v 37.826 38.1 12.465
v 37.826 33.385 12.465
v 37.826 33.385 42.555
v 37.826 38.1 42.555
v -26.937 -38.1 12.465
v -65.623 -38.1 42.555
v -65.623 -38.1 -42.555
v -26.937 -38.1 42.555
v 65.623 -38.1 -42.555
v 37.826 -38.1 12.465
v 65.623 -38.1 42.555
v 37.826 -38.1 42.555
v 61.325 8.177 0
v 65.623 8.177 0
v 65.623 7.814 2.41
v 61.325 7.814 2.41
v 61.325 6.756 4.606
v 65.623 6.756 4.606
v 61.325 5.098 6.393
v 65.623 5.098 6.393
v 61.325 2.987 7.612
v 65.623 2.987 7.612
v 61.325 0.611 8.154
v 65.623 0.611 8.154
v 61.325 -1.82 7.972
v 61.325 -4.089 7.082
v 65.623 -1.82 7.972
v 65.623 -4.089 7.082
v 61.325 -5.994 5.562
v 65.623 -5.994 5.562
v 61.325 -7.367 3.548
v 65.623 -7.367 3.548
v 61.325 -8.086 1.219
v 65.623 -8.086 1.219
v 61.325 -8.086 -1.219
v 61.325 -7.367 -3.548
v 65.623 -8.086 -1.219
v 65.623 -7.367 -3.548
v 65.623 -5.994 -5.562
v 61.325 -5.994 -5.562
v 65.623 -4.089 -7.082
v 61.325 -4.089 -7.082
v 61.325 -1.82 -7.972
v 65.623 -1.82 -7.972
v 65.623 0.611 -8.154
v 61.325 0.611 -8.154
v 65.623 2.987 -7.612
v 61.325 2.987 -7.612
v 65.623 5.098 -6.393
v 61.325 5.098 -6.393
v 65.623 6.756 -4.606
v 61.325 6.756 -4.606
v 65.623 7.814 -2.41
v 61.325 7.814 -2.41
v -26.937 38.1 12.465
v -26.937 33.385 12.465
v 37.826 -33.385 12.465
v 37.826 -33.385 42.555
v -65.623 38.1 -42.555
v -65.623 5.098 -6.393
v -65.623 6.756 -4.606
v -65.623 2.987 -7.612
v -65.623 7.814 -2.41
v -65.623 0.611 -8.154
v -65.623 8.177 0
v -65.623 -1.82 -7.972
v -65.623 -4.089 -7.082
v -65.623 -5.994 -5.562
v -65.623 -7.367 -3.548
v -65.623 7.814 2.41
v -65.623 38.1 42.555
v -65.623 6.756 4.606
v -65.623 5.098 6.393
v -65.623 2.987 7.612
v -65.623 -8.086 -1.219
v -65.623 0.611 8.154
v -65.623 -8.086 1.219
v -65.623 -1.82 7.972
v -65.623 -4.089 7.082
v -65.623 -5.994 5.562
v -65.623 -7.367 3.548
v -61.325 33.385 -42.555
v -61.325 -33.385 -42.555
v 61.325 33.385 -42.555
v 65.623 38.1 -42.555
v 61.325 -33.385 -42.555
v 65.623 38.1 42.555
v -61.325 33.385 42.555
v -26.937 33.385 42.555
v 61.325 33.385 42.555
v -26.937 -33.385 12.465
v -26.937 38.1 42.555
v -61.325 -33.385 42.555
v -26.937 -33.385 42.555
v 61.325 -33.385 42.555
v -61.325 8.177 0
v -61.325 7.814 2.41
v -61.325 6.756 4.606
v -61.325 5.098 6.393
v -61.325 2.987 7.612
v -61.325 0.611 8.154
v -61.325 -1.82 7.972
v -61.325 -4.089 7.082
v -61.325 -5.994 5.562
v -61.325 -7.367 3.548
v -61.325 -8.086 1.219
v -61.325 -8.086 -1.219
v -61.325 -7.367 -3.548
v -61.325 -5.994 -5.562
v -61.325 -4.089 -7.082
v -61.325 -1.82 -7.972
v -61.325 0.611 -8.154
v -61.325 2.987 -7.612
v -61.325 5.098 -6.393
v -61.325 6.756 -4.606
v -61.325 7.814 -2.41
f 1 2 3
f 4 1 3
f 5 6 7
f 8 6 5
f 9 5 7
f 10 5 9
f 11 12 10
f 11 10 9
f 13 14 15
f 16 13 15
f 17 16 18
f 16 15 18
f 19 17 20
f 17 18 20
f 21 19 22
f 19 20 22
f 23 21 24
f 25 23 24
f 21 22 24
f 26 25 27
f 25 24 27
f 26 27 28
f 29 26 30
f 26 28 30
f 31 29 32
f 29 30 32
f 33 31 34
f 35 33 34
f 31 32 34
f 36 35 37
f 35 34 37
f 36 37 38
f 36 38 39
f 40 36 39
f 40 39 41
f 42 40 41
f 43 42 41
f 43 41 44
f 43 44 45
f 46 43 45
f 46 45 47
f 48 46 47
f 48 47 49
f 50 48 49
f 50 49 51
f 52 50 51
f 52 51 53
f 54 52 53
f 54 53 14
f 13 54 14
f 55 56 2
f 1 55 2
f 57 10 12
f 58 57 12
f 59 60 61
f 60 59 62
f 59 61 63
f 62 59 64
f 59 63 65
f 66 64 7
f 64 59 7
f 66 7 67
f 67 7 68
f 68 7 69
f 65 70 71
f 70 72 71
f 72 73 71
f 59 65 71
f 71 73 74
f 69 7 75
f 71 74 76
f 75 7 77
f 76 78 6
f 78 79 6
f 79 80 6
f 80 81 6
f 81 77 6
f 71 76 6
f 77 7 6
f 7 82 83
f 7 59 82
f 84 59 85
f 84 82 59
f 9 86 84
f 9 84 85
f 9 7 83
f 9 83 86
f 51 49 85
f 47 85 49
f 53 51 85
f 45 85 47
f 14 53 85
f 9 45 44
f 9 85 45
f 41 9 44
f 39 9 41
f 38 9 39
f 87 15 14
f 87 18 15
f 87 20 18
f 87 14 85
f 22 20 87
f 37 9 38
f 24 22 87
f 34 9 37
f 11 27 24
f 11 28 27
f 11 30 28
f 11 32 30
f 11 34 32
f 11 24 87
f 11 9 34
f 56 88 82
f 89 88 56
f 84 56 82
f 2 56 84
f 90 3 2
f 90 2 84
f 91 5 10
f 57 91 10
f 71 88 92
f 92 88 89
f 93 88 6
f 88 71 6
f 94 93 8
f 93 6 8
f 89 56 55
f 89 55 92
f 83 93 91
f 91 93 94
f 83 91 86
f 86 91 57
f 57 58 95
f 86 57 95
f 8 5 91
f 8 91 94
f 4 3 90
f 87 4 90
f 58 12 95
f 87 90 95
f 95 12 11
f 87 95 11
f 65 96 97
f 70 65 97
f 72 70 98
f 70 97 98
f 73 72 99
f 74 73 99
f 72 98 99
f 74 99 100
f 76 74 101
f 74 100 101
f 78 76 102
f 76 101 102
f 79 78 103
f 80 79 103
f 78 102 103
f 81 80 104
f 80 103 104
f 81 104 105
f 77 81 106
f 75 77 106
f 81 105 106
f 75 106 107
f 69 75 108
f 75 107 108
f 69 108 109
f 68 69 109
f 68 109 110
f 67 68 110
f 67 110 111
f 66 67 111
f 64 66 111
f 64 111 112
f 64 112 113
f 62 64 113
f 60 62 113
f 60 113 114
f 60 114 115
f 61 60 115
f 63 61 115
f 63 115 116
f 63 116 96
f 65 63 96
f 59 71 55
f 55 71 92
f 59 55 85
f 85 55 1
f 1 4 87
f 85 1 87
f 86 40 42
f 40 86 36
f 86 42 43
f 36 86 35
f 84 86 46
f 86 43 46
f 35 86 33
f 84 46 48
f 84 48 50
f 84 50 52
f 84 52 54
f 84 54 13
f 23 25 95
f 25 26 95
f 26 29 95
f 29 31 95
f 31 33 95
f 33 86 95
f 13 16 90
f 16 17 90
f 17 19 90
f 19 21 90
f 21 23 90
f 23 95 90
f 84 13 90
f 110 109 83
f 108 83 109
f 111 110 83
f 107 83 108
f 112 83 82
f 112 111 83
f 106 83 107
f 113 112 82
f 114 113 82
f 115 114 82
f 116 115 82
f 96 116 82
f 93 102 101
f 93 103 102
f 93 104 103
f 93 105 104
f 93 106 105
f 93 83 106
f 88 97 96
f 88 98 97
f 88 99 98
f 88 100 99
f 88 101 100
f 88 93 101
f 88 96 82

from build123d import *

# Parameters (mm, degrees)
F0_W     = 131.2458962202
F0_H     = 85.1092487574
F1_DEPTH = 38.1
F2_W     = 122.6490065455
F2_H     = 66.7691901326
F3_DEPTH = 109.982
F4_R     = 8.1771007469
F5_DEPTH = 175.514
F6_W     = 64.7632628679
F6_H     = 36.3935176283
F7_DEPTH = 112.776


with BuildPart() as f1:
    # F0 (on Front) → F1 (new body, symmetric)
    with BuildSketch(Plane.XZ):
        Rectangle(F0_W, F0_H)
    extrude(amount=F1_DEPTH, both=True)

    # F2 (on face) → F3 (cut)
    with BuildSketch(Plane.XY.offset(42.5546243787)):
        Rectangle(F2_W, F2_H)
    extrude(amount=-F3_DEPTH, mode=Mode.SUBTRACT)

    # F4 (on face) → F5 (cut)
    with BuildSketch(Plane.YZ.offset(65.6229481101)):
        Circle(F4_R)
    extrude(amount=-F5_DEPTH, mode=Mode.SUBTRACT)

    # F6 (on face) → F7 (cut)
    with BuildSketch(Plane.XZ.offset(38.1)):
        with Locations((5.444701761, 30.6622525677)):
            Rectangle(F6_W, F6_H)
    extrude(amount=-F7_DEPTH, mode=Mode.SUBTRACT)


solid = f1.part
